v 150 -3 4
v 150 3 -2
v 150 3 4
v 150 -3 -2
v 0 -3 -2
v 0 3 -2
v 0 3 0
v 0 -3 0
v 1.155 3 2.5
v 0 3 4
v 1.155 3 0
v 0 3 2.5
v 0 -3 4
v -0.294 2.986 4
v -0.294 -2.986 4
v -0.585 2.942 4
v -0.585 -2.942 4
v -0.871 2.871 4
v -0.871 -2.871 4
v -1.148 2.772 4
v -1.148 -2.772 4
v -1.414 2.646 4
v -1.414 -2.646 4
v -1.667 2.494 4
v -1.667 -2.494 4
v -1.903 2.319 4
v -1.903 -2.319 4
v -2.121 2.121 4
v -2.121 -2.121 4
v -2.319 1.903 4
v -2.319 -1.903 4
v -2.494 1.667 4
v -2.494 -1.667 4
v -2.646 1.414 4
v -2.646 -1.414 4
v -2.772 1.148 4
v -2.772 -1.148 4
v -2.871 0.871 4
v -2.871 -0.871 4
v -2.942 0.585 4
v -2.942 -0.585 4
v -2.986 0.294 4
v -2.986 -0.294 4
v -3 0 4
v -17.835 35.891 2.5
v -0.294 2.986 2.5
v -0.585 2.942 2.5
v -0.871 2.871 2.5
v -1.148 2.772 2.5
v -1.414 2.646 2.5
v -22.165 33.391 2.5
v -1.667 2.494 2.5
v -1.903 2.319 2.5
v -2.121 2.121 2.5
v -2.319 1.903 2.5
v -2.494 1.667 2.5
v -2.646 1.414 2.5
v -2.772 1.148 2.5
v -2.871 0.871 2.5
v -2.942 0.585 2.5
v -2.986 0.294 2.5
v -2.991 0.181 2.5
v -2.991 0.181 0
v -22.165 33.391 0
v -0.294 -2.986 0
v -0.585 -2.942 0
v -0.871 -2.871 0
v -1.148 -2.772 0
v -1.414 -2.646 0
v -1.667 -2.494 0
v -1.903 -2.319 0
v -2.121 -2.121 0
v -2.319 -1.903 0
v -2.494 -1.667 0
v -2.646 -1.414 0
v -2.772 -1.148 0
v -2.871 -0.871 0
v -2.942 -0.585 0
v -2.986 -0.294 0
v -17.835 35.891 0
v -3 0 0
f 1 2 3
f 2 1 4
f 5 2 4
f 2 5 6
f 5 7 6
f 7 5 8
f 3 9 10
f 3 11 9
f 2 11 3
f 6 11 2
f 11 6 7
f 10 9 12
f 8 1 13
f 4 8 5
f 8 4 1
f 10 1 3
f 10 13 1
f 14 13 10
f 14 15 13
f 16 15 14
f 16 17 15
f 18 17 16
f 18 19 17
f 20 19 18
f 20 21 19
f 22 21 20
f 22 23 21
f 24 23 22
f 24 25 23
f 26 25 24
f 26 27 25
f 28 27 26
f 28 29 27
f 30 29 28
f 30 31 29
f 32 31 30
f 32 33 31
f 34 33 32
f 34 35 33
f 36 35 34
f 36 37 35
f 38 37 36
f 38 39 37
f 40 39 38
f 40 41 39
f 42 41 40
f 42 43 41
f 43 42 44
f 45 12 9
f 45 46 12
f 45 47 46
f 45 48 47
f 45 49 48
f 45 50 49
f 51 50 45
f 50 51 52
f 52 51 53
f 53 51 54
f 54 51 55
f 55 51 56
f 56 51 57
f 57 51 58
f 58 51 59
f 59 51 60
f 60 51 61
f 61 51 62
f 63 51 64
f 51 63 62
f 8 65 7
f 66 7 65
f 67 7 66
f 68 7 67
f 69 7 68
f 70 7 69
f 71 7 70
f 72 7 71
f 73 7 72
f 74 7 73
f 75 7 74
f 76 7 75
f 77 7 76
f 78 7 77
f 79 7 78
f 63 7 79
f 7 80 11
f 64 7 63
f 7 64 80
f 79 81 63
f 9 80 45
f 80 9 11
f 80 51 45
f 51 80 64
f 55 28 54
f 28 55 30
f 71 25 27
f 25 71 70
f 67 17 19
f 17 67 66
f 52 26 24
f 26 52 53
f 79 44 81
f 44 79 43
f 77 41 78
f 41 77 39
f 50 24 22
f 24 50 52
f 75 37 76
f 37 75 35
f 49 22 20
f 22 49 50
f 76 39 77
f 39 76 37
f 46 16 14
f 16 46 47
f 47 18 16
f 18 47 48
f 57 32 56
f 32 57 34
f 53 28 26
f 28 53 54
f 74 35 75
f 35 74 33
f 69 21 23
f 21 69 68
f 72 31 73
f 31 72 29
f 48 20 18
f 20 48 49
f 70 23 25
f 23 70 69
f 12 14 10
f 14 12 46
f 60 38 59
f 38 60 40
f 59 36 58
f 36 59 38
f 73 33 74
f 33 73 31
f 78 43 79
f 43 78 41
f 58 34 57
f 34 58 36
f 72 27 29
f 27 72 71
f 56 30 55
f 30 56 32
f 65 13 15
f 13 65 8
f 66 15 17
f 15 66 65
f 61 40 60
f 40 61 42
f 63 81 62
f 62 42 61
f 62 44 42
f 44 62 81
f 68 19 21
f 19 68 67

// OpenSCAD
// --- Dimensions ---
handle_length = 150;      // Length of the handle bar (mm)
handle_width = 6;         // Width of the handle bar (mm)
handle_thickness = 4;     // Thickness of the handle bar (mm)

foot_length = 40;         // Length of the spreading foot (mm)
foot_width = 5;           // Width of the spreading foot (mm)
foot_thickness = 2.5;     // Thickness of the spreading foot (mm)

boss_diameter = 6;        // Diameter of the joining boss (mm)
boss_height = 4;          // Height of the joining boss (mm)

hole_diameter = 4;        // Diameter of the hanging hole (mm)
hole_x_pos = 143;         // X position of the hole center (mm)

angle_deg = 120;          // Angle of the foot relative to the handle (degrees)

// --- Constants ---
$fn = 64;

// --- Main Model ---
// The part is printed lying flat on the XY plane.
// The origin (0,0,0) is the center of the base of the boss.

union() {
    // 1. The Handle
    // Centered on Y, extends from X=0 to X=150
    translate([handle_length / 2, 0, 0])
    cube([handle_length, handle_width, handle_thickness], center = true);
    
    // Note: To match the user's specific coordinate request (x=0 to 150, y=-3 to 3, z=0 to 4)
    // we use a translate to place the cube correctly.
    // However, to ensure it rests on Z=0, we use the following:
    translate([handle_length/2, 0, handle_thickness/2])
    cube([handle_length, handle_width, handle_thickness], center = true);

    // 2. The Spreading Foot
    // The centerline starts at origin and points 120 degrees CCW from +X.
    // We rotate the foot around the Z axis.
    rotate([0, 0, angle_deg])
    translate([foot_length / 2, 0, foot_thickness / 2])
    cube([foot_length, foot_width, foot_thickness], center = true);

    // 3. The Boss
    // Joins the bars at the origin.
    translate([0, 0, boss_height / 2])
    cylinder(h = boss_height, d = boss_diameter, center = true);
}

// --- Subtractions ---
difference() {
    // We wrap the whole assembly in a difference to cut the hole
    // But to keep the code clean, we'll just subtract the hole from the handle.
    // Since the handle is part of the union above, we must structure the code properly.
}

// Corrected Structure for Difference
difference() {
    // The entire solid object
    union() {
        // Handle
        translate([handle_length/2, 0, handle_thickness/2])
        cube([handle_length, handle_width, handle_thickness], center = true);
        
        // Foot
        rotate([0, 0, angle_deg])
        translate([foot_length / 2, 0, foot_thickness / 2])
        cube([foot_length, foot_width, foot_thickness], center = true);
        
        // Boss
        translate([0, 0, boss_height / 2])
        cylinder(h = boss_height, d = boss_diameter, center = true);
    }

    // 4. The Hanging Hole
    // Through the handle at x = 143, y = 0.
    // We extend the cylinder slightly in Z to ensure a clean cut.
    translate([hole_x_pos, 0, -1])
    cylinder(h = handle_thickness + 2, d = hole_diameter, center = true);
}

// Re-defining the handle/foot/boss logic inside a single difference block for valid rendering
// The previous block was a conceptual breakdown. Here is the final single-block logic:

/* 
Final Logic Implementation:
*/

// (The code above is actually two blocks; I will consolidate it into one valid block below)
